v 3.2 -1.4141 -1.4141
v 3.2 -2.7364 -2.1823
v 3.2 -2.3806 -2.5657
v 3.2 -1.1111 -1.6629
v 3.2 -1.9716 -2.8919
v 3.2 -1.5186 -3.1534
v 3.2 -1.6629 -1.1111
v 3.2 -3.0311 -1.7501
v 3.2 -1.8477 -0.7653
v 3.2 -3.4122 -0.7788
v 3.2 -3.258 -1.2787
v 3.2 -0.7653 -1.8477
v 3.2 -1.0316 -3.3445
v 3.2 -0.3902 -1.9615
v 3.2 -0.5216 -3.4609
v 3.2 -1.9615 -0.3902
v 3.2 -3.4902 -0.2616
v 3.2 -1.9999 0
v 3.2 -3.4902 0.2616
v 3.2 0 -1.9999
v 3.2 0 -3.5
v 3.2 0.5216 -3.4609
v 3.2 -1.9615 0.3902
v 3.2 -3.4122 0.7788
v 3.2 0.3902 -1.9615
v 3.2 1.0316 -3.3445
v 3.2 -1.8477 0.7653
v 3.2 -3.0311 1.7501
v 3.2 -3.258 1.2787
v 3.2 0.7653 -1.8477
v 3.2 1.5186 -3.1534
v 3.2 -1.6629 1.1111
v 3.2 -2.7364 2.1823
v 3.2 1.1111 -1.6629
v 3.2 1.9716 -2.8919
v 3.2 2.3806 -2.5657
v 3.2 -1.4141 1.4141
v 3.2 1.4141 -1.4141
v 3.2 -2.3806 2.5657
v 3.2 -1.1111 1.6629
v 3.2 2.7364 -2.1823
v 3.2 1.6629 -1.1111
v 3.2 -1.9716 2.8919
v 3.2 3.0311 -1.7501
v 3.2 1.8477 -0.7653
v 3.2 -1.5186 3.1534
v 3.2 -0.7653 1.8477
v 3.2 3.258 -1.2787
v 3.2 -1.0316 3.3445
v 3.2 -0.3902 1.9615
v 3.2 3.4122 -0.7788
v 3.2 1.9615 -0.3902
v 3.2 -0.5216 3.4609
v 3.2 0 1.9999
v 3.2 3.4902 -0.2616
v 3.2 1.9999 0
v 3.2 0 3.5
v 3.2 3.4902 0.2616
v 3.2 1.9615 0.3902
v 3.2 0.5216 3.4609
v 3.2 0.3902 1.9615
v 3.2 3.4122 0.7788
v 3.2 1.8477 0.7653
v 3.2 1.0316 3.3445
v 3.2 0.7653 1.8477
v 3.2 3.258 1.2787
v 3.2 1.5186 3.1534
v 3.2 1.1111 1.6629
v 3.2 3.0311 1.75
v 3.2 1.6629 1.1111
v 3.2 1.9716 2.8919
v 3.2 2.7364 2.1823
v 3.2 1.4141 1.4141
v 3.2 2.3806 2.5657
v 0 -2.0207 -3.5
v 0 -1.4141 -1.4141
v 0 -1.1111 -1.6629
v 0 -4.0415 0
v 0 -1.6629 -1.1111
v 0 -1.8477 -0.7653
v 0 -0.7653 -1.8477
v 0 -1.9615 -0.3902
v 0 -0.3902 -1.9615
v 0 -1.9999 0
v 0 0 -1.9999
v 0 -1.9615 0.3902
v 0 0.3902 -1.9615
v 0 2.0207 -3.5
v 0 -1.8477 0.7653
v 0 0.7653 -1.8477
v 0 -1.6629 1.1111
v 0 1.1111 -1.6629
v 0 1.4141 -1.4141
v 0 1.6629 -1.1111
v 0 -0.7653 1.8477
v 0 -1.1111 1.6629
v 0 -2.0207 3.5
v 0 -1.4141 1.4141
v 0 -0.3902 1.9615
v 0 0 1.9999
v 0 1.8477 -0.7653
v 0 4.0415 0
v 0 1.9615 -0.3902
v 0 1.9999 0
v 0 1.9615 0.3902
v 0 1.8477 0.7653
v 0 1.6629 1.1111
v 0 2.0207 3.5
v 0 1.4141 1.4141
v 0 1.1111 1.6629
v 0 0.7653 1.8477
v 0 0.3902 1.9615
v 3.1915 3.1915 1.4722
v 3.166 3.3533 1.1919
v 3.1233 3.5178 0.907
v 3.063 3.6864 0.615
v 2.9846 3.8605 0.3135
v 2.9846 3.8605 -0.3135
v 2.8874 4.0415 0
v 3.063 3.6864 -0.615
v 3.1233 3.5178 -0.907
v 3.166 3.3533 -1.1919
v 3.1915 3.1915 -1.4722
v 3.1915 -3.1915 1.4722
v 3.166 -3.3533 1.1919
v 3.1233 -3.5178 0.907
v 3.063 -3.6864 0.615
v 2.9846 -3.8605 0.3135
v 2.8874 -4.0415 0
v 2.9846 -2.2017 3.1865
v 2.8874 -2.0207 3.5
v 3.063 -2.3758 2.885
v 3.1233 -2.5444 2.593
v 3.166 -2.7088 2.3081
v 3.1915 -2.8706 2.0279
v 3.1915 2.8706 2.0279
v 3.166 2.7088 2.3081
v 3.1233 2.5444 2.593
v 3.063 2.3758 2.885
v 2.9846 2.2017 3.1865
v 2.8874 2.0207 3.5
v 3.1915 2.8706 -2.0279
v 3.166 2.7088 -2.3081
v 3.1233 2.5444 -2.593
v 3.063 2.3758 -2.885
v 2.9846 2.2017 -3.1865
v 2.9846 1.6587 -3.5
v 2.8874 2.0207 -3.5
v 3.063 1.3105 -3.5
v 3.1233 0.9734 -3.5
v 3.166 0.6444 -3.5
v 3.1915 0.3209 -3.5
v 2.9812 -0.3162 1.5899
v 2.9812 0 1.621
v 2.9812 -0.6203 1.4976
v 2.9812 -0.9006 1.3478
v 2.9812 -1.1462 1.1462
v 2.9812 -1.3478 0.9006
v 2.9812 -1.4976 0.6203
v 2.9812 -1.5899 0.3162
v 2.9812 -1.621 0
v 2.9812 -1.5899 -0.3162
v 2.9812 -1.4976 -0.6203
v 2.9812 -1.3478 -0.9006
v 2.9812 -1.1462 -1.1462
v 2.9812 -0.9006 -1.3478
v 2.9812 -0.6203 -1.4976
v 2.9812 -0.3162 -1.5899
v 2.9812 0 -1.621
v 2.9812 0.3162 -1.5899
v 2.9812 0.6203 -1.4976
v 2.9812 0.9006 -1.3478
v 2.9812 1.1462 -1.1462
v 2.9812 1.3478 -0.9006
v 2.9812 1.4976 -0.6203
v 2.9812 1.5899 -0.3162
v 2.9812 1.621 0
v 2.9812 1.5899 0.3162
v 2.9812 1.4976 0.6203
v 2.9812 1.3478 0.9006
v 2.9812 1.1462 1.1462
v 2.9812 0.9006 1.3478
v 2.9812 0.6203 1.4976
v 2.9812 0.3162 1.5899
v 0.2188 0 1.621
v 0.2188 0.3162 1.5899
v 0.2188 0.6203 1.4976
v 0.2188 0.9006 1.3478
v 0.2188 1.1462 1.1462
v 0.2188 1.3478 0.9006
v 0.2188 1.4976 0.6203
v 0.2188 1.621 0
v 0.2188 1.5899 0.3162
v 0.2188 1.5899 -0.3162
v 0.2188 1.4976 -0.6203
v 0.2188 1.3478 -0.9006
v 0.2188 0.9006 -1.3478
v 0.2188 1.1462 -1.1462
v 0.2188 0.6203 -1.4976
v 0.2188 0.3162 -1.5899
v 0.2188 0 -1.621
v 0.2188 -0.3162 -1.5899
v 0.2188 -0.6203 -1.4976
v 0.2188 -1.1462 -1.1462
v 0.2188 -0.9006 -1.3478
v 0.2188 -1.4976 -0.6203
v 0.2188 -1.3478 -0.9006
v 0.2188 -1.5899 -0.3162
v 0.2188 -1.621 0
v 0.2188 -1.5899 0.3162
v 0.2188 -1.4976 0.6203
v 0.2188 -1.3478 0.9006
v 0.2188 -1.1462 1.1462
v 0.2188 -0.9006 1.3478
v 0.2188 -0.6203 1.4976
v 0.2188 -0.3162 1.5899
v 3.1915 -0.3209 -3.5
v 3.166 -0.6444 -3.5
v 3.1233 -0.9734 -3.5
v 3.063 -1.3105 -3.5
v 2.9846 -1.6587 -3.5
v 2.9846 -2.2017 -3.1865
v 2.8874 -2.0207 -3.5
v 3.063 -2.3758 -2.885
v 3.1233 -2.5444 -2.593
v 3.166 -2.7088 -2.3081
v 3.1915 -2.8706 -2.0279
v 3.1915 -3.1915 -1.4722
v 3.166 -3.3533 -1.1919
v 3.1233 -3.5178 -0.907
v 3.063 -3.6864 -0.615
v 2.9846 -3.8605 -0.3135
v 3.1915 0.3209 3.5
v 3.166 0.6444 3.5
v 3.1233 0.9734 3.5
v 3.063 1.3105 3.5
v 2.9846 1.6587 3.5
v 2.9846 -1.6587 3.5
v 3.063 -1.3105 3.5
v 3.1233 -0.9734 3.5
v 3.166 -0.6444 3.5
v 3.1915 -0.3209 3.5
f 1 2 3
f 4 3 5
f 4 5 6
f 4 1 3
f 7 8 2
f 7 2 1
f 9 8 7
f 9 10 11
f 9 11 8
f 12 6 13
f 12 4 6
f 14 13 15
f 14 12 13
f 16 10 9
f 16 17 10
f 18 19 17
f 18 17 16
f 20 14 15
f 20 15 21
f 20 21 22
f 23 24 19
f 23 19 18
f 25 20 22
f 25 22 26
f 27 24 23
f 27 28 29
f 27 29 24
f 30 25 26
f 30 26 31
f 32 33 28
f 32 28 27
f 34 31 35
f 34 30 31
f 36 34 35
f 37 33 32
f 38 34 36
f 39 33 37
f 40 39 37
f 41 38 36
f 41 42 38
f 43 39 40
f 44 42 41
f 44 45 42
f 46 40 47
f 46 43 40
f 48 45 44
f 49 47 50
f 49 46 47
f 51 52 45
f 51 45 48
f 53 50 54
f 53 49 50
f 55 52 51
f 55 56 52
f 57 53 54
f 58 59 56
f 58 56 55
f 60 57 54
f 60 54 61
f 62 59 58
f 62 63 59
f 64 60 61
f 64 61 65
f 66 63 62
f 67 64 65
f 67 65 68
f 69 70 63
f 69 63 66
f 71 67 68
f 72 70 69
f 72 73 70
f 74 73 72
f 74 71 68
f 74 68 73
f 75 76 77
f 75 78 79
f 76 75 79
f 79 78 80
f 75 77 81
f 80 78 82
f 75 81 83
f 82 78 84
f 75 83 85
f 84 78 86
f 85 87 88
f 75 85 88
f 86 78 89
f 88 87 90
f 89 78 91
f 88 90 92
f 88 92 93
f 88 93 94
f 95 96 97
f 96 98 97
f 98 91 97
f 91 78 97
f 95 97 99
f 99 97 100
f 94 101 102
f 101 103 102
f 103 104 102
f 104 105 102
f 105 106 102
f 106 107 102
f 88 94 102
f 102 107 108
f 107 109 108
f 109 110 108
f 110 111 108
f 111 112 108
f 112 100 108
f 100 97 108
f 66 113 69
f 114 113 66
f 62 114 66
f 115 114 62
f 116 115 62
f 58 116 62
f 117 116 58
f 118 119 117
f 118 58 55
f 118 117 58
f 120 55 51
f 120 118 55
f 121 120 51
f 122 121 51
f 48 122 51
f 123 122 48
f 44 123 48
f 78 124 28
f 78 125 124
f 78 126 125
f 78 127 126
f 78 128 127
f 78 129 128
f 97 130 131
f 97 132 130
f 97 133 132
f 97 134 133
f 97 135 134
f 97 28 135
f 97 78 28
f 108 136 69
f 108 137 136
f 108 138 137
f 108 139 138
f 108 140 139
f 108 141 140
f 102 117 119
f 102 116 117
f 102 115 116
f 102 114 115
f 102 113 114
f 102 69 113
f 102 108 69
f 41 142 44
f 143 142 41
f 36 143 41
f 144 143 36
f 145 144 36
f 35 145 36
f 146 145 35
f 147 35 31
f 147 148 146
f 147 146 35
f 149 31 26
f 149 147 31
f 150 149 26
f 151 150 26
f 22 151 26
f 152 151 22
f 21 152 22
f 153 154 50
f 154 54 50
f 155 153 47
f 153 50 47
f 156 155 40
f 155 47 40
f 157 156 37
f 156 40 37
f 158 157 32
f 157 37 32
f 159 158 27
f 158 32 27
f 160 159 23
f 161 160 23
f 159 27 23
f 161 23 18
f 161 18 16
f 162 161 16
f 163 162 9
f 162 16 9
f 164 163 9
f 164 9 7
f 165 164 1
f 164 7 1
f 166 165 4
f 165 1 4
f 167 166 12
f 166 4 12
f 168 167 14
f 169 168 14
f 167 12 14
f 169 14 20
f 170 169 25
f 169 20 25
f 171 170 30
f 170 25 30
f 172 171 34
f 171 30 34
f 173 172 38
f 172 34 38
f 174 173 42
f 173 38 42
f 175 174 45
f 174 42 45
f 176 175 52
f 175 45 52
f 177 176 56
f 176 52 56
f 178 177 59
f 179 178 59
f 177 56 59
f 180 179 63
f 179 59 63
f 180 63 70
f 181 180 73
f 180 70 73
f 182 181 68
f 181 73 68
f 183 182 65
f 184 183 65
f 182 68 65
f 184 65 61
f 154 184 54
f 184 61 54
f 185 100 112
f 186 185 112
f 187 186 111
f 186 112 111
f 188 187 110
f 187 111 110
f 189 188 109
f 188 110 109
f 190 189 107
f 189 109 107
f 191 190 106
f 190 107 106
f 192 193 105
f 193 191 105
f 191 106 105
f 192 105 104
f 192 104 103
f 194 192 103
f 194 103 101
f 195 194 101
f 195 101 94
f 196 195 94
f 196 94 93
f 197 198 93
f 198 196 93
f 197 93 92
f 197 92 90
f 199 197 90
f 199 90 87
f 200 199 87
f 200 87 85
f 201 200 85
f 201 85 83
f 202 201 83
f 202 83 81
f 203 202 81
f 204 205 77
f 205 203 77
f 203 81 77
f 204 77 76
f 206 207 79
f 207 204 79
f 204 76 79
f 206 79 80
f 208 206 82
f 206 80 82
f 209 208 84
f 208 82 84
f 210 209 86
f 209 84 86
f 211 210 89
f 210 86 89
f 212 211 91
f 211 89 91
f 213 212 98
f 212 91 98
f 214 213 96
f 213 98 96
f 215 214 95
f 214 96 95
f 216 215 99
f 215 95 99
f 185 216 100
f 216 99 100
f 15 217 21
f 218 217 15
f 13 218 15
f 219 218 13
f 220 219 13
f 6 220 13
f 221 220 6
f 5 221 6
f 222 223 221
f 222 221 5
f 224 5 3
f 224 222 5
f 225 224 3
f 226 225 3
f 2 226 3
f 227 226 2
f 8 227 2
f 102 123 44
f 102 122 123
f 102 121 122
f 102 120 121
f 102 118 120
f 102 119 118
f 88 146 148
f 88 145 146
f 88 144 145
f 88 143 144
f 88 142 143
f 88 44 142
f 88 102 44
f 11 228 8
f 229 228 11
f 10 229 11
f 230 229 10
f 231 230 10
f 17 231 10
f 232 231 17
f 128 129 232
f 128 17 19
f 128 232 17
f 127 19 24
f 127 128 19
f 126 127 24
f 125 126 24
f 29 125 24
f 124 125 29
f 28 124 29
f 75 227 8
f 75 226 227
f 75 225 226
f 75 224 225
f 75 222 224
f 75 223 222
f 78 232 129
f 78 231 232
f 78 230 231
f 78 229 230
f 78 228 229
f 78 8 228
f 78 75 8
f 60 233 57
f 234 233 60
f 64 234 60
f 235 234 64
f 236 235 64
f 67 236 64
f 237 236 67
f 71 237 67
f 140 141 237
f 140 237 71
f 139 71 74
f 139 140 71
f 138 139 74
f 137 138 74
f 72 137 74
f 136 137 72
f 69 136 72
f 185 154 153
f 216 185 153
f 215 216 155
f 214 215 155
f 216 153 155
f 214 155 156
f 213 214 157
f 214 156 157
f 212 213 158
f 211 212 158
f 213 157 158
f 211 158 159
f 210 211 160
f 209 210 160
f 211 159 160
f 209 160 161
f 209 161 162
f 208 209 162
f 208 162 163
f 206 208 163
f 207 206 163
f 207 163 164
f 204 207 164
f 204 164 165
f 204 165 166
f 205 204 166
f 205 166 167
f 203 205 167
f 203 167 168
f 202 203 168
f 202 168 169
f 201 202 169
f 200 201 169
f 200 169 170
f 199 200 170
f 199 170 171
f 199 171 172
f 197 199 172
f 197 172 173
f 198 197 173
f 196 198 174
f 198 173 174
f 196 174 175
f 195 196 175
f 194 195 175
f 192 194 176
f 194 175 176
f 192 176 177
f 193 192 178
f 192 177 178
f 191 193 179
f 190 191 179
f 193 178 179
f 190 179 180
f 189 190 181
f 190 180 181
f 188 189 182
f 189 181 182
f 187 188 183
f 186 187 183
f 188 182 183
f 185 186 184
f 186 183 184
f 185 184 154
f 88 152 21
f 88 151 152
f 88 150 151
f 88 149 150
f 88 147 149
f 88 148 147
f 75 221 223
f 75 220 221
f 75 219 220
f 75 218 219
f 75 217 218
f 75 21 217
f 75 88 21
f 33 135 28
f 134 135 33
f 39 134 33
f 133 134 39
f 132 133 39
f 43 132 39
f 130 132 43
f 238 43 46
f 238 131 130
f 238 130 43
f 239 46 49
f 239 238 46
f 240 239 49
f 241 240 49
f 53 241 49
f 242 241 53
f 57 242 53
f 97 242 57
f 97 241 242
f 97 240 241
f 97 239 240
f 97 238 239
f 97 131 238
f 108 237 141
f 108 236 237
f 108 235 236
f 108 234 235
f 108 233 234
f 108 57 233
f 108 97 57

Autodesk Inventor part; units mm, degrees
ref_plane "YZ Plane" through (0, 0, 0) normal (1, 0, 0) x (0, 1, 0)
ref_plane "XZ Plane" through (0, 0, 0) normal (0, 1, 0) x (-1, 0, 0)
sketch "Sketch1" plane through (0, 0, 0) normal (1, 0, 0) x (0, 1, 0)
  line L0 (4.0415, 0) -> (2.0207, -3.5)
  line L1 (2.0207, -3.5) -> (-2.0207, -3.5)
  line L2 (-2.0207, -3.5) -> (-4.0415, 0)
  line L3 (-4.0415, 0) -> (-2.0207, 3.5)
  line L4 (-2.0207, 3.5) -> (2.0207, 3.5)
  line L5 (2.0207, 3.5) -> (4.0415, 0)
  point P0 (0, 0)
  point P1 (0, 0)
  dimension "d0" = 8.0829
extrude "Body" add sketch "Sketch1" along normal blind 3.2
sketch "Sketch2" plane through (0, 0, 0) normal (-1, 0, 0) x (0, 0, 1)
  point P0 (0, 0)
hole "Thread" at (0, 0, 0) direction (1, 0, 0) diameter 3.242 end through all thread size "M4x0.7" class "6H" standard "ISO Metric profile"
chamfer "Chamfer1" distance 0.3789 angle 30 1 edges at (0, 0, -1.621) measured on face at (0, 2.4654, 1.4736)
chamfer "Chamfer2" distance 0.3789 angle 30 1 edges at (3.2, 0, -1.621) measured on face at (3.2, 2.4654, 1.4736)
sketch "Sketch3" plane through (0, 0, 0) normal (0, 0, 1) x (1, 0, 0)
  line L0 (0, 4.0415) -> (3.2, 4.0415) projected
  line L1 (3.2, 2.0207) -> (3.2, 4.0415) projected
  line L2 (-0.64, 0) -> (3.84, 0) projected
  line L3 (2.8874, 4.0415) -> (3.2, 3.5)
  dimension "d3" = 7
  dimension "d4" = 30
revolve "Chamfer3" cut sketch "Sketch3" angle 360 about axis through (-10, 0, 0) along (1, 0, 0)
ref_plane "Work Plane1" through (11.1612, 0, 0) normal (0, 0.866, -0.5) x (-1, 0, 0)
equation "\"d0\" = 1.1547 * SW"
equation "\"d1\" = KOH"
equation "\"d13\" = -0.5 * GD1 + 0.5 * NND"
equation "\"d21\" = -0.5 * GD1 + 0.5 * NND"
equation "\"d15\" = -0.5 * GD1 + 0.5 * NND"
equation "\"d22\" = -0.5 * GD1 + 0.5 * NND"
equation "\"d3\" = SW01"
equation "\"d4\" = ANG2"
equation "\"ANG2\" = 30deg"
equation "\"NND\" = 4"
equation "\"KOH\" = 3.2"
equation "\"SW\" = 7"
equation "\"SW01\" = SW"
equation "\"GUL\" = 0.541266 * PTC"
equation "\"TOA\" = 30deg"
equation "\"PTC\" = 0.7"
equation "\"E0\" = 1.155 * SW"
equation "\"THREADDIA\" = 4"
equation "\"GAL\" = 0.541266 * PTC"
equation "\"GD1\" = 3.242228"
properties part number "JIS B 1181 - HN - class 1 - Finished - M4" material "Steel, Mild"
